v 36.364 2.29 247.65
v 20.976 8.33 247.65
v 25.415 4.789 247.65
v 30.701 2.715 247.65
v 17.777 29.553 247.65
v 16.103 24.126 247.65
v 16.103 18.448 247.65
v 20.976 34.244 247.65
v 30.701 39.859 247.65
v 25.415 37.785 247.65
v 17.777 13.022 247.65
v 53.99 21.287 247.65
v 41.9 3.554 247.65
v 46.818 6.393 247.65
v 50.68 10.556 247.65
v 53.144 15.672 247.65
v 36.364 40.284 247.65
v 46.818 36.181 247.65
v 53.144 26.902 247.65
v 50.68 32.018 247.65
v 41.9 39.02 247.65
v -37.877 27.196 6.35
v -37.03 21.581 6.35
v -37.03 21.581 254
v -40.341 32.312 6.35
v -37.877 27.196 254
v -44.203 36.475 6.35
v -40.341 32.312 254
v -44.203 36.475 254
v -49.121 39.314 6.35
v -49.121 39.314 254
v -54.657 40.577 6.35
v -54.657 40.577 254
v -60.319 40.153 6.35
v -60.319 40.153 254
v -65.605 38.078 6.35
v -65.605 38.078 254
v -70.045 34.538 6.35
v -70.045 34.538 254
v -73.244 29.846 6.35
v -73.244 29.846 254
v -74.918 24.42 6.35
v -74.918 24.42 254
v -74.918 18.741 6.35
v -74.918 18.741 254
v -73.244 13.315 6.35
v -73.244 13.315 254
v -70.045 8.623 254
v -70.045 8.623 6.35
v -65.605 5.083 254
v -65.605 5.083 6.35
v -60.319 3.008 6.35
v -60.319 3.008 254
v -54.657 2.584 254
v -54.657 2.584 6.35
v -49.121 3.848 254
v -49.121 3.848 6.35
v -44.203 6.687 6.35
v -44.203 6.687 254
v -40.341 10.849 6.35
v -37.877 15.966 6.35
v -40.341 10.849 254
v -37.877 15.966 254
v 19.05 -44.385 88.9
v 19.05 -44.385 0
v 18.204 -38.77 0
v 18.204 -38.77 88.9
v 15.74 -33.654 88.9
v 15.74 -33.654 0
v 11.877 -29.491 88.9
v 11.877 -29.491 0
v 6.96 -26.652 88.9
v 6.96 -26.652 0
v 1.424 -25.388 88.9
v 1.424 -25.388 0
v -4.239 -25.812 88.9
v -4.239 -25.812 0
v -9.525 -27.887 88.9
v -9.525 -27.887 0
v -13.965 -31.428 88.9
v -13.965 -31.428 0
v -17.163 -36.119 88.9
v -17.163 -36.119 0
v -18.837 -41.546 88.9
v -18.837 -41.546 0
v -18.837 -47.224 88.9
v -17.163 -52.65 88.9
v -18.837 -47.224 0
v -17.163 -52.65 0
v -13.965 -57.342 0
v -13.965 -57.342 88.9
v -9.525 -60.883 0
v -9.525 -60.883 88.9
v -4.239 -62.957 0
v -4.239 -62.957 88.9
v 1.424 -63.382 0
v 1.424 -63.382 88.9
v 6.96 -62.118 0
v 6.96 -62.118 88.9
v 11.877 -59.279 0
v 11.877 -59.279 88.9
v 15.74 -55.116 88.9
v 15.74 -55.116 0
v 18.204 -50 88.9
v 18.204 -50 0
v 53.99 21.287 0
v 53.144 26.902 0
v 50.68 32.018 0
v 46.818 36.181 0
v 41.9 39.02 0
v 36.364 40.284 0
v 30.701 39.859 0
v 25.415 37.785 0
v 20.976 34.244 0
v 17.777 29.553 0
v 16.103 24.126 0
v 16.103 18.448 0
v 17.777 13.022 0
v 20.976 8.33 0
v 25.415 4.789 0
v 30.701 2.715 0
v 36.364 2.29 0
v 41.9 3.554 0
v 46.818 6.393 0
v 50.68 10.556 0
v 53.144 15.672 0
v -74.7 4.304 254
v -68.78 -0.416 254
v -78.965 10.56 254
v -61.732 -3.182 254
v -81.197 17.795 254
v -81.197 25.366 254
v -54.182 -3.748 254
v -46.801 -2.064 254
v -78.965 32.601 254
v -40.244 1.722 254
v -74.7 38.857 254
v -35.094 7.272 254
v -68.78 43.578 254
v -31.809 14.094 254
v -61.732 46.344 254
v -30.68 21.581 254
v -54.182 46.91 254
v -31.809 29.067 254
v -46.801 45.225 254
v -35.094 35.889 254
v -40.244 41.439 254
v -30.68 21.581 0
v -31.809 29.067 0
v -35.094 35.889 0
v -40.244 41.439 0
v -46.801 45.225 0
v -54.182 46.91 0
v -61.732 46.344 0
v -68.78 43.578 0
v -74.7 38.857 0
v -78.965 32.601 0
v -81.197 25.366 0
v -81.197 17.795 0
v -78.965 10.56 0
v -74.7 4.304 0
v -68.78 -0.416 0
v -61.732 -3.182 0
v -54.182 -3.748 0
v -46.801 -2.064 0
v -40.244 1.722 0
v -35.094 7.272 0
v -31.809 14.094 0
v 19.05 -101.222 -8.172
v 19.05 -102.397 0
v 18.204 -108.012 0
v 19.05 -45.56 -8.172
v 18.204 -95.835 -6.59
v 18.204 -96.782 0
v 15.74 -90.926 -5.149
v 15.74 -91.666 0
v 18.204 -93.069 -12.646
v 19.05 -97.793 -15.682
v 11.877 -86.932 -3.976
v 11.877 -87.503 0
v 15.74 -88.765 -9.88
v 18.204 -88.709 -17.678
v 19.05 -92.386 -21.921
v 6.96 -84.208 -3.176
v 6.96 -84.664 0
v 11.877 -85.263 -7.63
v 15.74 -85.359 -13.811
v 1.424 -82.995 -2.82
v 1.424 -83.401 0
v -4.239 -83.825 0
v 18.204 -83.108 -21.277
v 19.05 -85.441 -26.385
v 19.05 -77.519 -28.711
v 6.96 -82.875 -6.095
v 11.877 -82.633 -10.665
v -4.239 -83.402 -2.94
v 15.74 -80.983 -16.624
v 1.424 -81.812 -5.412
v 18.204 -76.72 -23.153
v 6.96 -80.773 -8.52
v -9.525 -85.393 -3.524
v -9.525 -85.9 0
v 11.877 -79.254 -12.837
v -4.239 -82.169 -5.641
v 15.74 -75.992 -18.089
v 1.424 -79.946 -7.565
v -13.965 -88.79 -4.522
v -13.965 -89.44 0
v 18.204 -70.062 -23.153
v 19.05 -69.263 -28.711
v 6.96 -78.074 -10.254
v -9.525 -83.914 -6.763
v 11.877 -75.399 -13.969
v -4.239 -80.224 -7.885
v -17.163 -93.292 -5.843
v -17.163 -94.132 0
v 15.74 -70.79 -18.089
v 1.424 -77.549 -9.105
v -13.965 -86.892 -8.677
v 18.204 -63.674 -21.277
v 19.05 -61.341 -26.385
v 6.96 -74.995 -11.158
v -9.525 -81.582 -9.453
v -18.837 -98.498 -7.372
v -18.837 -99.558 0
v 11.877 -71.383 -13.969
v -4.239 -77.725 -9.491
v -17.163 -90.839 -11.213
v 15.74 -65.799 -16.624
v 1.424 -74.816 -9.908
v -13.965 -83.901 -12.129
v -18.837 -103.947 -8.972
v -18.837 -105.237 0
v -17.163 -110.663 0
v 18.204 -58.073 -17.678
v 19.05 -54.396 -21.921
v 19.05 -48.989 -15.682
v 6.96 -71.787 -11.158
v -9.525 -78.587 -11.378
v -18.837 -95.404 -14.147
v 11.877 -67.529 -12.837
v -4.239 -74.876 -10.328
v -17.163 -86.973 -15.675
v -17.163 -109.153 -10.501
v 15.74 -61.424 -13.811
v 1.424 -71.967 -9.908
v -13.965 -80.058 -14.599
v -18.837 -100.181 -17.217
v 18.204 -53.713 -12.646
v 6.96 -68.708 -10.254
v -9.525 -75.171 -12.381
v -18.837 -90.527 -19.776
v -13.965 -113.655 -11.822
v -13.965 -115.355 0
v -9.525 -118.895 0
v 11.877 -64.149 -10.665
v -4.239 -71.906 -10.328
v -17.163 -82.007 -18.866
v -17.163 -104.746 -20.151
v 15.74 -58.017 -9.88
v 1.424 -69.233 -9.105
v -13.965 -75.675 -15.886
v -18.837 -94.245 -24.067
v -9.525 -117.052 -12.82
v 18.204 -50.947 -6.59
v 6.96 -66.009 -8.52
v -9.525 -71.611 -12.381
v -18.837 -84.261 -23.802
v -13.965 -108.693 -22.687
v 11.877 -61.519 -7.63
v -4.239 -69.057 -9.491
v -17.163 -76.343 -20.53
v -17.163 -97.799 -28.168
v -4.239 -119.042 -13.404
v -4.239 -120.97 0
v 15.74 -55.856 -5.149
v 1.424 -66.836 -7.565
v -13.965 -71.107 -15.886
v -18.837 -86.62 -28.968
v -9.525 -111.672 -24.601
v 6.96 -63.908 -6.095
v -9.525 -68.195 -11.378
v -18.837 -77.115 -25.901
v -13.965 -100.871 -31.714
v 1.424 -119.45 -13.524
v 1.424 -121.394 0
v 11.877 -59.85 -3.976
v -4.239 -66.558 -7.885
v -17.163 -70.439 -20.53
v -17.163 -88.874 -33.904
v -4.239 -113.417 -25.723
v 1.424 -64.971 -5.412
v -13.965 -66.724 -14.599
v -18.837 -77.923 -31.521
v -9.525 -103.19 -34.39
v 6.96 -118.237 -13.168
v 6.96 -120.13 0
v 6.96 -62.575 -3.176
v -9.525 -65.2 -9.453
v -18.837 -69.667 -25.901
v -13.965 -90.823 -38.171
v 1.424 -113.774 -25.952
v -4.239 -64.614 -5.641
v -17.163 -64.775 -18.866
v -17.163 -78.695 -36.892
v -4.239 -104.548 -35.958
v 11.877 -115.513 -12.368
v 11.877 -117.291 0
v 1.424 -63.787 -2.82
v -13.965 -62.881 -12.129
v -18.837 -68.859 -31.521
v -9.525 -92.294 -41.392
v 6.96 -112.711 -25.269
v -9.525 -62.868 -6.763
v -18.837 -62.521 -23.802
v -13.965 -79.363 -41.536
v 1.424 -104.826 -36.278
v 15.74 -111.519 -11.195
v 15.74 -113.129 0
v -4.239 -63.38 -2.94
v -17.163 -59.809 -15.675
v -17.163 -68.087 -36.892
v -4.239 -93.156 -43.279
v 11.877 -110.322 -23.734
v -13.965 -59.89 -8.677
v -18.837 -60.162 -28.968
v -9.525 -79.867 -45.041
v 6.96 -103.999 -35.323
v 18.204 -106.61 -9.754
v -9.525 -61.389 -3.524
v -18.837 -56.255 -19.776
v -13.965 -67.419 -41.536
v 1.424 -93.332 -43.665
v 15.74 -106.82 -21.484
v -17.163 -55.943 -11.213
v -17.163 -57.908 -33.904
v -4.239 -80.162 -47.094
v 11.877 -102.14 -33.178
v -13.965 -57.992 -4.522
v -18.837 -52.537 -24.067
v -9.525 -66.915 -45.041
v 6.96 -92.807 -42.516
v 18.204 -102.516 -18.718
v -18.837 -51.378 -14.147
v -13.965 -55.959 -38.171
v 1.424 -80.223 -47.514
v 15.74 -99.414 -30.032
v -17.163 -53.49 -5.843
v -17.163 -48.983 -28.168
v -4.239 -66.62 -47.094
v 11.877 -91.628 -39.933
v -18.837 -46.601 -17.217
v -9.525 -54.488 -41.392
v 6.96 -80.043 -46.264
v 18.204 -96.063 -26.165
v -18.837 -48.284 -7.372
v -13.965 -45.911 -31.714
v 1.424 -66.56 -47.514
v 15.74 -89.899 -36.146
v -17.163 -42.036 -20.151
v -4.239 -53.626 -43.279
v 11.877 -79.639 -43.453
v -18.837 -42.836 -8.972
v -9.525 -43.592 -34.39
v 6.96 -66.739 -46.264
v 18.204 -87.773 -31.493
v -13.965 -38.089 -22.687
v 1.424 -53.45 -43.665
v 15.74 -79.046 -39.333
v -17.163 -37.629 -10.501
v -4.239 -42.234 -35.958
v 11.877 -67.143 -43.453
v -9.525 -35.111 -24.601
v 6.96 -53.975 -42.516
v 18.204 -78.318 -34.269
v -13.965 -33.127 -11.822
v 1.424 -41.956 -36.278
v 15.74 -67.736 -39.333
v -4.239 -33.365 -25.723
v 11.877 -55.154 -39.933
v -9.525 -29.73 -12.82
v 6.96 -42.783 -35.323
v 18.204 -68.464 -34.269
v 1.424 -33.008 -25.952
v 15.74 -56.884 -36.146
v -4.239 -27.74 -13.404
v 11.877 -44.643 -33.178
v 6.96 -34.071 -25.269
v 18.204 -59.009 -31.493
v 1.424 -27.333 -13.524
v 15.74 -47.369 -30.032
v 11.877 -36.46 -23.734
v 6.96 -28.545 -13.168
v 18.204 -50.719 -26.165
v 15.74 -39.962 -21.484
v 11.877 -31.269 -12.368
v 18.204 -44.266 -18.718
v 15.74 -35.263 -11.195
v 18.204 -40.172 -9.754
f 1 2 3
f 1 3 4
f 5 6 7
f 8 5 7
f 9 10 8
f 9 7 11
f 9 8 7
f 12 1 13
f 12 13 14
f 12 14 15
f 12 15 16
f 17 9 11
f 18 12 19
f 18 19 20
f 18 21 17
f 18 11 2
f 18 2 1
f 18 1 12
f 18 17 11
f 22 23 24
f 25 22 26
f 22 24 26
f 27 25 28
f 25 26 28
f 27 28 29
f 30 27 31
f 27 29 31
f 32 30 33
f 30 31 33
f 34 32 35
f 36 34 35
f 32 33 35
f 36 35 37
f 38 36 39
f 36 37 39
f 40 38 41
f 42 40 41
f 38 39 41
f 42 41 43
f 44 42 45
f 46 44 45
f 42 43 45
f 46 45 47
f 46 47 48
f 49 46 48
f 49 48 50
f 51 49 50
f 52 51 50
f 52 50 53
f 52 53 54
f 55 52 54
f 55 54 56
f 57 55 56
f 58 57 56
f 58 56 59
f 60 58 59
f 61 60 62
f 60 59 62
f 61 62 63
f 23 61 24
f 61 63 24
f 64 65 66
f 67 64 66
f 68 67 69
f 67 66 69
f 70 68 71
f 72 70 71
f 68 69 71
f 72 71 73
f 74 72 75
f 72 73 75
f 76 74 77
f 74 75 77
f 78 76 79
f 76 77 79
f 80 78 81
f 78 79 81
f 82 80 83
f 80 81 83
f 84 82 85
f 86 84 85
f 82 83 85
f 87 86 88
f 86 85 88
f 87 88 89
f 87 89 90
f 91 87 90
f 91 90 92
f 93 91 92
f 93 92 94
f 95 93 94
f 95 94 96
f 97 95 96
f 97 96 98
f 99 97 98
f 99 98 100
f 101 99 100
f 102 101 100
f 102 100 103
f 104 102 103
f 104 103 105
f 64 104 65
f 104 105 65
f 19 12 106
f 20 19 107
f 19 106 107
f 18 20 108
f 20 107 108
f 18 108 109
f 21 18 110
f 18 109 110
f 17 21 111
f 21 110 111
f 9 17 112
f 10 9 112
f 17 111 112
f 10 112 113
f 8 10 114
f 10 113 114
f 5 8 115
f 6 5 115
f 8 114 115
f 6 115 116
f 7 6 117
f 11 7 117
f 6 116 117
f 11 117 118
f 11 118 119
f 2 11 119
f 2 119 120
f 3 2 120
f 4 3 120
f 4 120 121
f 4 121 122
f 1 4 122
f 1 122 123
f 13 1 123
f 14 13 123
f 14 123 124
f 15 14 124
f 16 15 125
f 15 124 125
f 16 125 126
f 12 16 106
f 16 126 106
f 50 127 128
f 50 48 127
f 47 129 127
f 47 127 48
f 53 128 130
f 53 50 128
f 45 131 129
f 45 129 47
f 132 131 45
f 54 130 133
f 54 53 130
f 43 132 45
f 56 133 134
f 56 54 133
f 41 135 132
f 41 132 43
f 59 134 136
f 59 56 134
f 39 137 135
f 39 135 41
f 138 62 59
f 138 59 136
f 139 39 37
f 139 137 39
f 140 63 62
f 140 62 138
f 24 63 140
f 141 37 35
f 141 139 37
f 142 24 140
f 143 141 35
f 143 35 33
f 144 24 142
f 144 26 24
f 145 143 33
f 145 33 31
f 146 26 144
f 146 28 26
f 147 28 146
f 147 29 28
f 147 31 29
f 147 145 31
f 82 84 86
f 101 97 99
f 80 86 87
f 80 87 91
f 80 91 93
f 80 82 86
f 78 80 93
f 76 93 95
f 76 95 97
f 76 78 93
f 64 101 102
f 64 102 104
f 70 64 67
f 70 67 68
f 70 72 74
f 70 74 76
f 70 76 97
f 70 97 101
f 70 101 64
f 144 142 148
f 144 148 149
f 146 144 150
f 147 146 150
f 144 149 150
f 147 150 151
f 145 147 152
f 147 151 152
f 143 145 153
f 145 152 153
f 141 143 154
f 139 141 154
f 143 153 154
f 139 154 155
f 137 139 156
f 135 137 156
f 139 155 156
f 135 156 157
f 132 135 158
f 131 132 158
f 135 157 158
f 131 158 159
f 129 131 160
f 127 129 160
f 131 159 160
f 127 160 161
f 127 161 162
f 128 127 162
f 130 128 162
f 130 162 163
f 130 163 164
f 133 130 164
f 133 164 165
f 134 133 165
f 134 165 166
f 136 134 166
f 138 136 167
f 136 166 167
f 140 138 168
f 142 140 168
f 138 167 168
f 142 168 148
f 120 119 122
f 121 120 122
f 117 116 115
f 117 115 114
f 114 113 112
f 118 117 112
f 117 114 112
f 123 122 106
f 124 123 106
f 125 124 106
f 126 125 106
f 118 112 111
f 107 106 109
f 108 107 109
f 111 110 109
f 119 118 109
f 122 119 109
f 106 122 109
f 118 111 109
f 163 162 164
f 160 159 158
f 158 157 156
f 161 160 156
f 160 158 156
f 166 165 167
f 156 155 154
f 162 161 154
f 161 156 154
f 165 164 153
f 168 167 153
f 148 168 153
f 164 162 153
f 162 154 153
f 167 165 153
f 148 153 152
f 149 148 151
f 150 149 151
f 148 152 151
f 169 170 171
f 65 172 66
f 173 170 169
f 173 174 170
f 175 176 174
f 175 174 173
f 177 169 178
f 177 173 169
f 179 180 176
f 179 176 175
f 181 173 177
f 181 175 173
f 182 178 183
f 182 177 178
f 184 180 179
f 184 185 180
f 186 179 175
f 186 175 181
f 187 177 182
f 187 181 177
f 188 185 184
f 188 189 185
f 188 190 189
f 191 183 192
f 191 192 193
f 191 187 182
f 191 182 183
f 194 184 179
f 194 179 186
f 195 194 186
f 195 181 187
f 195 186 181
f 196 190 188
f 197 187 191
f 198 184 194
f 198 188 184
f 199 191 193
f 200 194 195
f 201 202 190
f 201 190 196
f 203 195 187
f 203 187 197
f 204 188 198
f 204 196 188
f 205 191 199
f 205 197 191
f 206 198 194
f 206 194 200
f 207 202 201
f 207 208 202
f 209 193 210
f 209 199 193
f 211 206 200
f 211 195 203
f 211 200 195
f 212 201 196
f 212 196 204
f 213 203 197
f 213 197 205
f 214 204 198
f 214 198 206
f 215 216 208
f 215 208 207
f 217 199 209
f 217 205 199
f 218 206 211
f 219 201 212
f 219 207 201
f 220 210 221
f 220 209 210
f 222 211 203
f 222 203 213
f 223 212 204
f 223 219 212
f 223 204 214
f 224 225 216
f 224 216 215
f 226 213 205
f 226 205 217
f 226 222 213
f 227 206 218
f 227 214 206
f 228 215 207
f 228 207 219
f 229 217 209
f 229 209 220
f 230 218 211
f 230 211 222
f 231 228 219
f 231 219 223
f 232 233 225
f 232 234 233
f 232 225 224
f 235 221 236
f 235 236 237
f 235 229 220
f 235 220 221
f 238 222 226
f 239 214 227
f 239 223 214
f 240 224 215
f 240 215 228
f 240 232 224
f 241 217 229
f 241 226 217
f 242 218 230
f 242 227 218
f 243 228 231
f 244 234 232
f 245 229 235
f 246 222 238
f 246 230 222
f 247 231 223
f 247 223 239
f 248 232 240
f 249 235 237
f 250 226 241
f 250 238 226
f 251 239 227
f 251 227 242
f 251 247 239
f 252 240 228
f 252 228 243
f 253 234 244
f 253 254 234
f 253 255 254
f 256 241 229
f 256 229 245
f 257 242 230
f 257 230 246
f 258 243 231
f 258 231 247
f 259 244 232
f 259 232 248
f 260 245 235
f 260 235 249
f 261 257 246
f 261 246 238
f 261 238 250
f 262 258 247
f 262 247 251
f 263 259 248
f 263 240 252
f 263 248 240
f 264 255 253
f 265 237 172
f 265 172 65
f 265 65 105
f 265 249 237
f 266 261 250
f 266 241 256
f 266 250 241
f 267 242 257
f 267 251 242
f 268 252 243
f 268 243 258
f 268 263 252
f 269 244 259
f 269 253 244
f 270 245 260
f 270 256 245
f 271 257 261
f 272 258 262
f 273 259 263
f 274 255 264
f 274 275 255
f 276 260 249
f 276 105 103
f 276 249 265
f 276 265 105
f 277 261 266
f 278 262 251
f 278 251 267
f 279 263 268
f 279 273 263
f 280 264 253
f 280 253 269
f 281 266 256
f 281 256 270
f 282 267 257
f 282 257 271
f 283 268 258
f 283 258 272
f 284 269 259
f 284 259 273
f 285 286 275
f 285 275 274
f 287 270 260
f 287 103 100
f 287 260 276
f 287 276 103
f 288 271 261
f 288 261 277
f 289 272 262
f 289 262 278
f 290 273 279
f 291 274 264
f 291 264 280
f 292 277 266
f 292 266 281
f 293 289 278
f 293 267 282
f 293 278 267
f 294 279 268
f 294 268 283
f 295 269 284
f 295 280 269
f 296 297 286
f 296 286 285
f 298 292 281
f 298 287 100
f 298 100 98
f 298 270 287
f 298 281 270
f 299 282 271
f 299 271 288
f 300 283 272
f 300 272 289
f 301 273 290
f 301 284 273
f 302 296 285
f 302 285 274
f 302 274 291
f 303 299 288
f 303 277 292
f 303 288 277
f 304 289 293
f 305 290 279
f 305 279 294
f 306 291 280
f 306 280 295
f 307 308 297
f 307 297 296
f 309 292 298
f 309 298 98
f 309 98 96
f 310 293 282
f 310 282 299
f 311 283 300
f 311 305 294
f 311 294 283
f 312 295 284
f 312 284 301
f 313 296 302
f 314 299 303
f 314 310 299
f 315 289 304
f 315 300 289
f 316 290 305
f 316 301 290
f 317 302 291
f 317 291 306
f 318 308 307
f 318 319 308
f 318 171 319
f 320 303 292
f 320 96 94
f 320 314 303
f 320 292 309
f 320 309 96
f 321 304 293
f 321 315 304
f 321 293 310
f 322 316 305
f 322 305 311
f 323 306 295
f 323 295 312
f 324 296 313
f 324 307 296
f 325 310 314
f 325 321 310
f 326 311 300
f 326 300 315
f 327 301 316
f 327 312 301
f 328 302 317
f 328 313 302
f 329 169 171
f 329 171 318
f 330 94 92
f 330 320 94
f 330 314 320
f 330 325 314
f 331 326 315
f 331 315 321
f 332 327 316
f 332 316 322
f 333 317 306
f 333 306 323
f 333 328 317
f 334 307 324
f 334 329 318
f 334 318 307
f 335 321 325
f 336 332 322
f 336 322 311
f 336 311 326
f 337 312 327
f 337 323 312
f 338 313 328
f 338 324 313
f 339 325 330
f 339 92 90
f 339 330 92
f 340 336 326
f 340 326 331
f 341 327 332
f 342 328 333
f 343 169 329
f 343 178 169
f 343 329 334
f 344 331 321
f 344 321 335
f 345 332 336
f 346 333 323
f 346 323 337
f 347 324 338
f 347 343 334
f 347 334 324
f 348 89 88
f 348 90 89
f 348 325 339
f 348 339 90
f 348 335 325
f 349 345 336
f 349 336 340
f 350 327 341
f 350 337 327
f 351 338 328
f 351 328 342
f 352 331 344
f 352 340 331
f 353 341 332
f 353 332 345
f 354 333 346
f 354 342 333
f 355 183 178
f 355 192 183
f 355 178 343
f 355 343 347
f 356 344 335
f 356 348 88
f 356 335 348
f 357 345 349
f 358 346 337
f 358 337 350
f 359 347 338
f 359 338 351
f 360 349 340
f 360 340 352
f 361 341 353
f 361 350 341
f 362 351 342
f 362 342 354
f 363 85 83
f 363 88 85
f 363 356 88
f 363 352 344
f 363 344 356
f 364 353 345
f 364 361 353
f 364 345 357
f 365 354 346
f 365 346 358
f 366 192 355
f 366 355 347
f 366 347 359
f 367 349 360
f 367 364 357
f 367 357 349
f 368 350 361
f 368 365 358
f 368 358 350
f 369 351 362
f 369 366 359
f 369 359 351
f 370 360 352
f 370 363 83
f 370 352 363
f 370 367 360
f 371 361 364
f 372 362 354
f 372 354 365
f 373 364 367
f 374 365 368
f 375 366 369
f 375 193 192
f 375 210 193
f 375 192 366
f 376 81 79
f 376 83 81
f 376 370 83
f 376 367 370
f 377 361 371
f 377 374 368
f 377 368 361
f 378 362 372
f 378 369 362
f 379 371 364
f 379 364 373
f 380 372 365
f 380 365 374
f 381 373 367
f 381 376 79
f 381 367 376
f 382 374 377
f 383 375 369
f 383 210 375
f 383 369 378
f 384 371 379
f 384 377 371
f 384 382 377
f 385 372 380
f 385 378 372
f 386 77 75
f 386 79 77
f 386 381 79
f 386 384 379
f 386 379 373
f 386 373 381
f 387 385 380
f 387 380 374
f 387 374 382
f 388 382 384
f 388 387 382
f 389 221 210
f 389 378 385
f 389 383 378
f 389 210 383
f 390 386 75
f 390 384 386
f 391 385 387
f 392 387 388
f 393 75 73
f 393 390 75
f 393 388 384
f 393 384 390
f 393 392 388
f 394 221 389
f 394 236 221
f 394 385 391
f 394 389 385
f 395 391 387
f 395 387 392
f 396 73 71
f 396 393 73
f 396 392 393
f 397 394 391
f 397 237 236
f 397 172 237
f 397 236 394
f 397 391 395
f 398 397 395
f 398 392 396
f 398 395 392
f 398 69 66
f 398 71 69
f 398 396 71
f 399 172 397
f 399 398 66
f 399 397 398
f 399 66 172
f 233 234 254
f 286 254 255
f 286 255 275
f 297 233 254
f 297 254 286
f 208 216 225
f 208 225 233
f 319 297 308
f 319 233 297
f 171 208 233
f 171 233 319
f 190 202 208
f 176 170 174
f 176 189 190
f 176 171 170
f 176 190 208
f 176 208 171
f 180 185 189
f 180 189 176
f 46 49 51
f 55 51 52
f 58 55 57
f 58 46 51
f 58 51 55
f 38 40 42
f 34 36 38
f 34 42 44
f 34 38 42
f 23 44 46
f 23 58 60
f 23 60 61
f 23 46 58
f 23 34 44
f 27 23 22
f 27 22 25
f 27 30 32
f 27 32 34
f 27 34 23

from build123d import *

# Parameters (mm, degrees)
F0_R     = 25.4
F2_DEPTH = 254
F0_R_2   = 19.05
F3_DEPTH = 247.65
F4_R     = 19.05
F5_DEPTH = 247.65
F6_DEPTH = 88.9


with BuildPart() as f2:
    # F0 (on Top) → F2 (new body)
    with BuildSketch(Plane.XY):
        with Locations((-56.080405, 21.580677)):
            Circle(F0_R)
    extrude(amount=F2_DEPTH)

    # F4 (on face) → F5 (cut)
    with BuildSketch(Plane.XY.offset(254)):
        with Locations((-56.080405, 21.580677)):
            Circle(F4_R)
    extrude(amount=-F5_DEPTH, mode=Mode.SUBTRACT)


with BuildPart() as f3:
    # F0 (on Top) → F3 (new body)
    with BuildSketch(Plane.XY):
        with Locations((34.940146, 21.287065)):
            Circle(F0_R_2)
    extrude(amount=F3_DEPTH)


with BuildPart() as f6:
    # F0 (on Top) → F6 (new body)
    with BuildSketch(Plane.XY):
        with Locations((0, -44.384841)):
            Circle(F0_R_2)
    extrude(amount=F6_DEPTH)

    # F7: sweep along a path in F1
    with BuildLine(Plane.YZ) as f7_path:
        ThreePointArc((-102.397329, 0), (-73.391085, -29.006244), (-44.384841, 0))
    # F0 (on Top) → F7 (sweep)
    with BuildSketch(Plane.XY):
        with Locations((0, -102.397329)):
            Circle(F0_R_2)
    sweep(path=f7_path.line)


solid = Compound([f2.part, f3.part, f6.part])
